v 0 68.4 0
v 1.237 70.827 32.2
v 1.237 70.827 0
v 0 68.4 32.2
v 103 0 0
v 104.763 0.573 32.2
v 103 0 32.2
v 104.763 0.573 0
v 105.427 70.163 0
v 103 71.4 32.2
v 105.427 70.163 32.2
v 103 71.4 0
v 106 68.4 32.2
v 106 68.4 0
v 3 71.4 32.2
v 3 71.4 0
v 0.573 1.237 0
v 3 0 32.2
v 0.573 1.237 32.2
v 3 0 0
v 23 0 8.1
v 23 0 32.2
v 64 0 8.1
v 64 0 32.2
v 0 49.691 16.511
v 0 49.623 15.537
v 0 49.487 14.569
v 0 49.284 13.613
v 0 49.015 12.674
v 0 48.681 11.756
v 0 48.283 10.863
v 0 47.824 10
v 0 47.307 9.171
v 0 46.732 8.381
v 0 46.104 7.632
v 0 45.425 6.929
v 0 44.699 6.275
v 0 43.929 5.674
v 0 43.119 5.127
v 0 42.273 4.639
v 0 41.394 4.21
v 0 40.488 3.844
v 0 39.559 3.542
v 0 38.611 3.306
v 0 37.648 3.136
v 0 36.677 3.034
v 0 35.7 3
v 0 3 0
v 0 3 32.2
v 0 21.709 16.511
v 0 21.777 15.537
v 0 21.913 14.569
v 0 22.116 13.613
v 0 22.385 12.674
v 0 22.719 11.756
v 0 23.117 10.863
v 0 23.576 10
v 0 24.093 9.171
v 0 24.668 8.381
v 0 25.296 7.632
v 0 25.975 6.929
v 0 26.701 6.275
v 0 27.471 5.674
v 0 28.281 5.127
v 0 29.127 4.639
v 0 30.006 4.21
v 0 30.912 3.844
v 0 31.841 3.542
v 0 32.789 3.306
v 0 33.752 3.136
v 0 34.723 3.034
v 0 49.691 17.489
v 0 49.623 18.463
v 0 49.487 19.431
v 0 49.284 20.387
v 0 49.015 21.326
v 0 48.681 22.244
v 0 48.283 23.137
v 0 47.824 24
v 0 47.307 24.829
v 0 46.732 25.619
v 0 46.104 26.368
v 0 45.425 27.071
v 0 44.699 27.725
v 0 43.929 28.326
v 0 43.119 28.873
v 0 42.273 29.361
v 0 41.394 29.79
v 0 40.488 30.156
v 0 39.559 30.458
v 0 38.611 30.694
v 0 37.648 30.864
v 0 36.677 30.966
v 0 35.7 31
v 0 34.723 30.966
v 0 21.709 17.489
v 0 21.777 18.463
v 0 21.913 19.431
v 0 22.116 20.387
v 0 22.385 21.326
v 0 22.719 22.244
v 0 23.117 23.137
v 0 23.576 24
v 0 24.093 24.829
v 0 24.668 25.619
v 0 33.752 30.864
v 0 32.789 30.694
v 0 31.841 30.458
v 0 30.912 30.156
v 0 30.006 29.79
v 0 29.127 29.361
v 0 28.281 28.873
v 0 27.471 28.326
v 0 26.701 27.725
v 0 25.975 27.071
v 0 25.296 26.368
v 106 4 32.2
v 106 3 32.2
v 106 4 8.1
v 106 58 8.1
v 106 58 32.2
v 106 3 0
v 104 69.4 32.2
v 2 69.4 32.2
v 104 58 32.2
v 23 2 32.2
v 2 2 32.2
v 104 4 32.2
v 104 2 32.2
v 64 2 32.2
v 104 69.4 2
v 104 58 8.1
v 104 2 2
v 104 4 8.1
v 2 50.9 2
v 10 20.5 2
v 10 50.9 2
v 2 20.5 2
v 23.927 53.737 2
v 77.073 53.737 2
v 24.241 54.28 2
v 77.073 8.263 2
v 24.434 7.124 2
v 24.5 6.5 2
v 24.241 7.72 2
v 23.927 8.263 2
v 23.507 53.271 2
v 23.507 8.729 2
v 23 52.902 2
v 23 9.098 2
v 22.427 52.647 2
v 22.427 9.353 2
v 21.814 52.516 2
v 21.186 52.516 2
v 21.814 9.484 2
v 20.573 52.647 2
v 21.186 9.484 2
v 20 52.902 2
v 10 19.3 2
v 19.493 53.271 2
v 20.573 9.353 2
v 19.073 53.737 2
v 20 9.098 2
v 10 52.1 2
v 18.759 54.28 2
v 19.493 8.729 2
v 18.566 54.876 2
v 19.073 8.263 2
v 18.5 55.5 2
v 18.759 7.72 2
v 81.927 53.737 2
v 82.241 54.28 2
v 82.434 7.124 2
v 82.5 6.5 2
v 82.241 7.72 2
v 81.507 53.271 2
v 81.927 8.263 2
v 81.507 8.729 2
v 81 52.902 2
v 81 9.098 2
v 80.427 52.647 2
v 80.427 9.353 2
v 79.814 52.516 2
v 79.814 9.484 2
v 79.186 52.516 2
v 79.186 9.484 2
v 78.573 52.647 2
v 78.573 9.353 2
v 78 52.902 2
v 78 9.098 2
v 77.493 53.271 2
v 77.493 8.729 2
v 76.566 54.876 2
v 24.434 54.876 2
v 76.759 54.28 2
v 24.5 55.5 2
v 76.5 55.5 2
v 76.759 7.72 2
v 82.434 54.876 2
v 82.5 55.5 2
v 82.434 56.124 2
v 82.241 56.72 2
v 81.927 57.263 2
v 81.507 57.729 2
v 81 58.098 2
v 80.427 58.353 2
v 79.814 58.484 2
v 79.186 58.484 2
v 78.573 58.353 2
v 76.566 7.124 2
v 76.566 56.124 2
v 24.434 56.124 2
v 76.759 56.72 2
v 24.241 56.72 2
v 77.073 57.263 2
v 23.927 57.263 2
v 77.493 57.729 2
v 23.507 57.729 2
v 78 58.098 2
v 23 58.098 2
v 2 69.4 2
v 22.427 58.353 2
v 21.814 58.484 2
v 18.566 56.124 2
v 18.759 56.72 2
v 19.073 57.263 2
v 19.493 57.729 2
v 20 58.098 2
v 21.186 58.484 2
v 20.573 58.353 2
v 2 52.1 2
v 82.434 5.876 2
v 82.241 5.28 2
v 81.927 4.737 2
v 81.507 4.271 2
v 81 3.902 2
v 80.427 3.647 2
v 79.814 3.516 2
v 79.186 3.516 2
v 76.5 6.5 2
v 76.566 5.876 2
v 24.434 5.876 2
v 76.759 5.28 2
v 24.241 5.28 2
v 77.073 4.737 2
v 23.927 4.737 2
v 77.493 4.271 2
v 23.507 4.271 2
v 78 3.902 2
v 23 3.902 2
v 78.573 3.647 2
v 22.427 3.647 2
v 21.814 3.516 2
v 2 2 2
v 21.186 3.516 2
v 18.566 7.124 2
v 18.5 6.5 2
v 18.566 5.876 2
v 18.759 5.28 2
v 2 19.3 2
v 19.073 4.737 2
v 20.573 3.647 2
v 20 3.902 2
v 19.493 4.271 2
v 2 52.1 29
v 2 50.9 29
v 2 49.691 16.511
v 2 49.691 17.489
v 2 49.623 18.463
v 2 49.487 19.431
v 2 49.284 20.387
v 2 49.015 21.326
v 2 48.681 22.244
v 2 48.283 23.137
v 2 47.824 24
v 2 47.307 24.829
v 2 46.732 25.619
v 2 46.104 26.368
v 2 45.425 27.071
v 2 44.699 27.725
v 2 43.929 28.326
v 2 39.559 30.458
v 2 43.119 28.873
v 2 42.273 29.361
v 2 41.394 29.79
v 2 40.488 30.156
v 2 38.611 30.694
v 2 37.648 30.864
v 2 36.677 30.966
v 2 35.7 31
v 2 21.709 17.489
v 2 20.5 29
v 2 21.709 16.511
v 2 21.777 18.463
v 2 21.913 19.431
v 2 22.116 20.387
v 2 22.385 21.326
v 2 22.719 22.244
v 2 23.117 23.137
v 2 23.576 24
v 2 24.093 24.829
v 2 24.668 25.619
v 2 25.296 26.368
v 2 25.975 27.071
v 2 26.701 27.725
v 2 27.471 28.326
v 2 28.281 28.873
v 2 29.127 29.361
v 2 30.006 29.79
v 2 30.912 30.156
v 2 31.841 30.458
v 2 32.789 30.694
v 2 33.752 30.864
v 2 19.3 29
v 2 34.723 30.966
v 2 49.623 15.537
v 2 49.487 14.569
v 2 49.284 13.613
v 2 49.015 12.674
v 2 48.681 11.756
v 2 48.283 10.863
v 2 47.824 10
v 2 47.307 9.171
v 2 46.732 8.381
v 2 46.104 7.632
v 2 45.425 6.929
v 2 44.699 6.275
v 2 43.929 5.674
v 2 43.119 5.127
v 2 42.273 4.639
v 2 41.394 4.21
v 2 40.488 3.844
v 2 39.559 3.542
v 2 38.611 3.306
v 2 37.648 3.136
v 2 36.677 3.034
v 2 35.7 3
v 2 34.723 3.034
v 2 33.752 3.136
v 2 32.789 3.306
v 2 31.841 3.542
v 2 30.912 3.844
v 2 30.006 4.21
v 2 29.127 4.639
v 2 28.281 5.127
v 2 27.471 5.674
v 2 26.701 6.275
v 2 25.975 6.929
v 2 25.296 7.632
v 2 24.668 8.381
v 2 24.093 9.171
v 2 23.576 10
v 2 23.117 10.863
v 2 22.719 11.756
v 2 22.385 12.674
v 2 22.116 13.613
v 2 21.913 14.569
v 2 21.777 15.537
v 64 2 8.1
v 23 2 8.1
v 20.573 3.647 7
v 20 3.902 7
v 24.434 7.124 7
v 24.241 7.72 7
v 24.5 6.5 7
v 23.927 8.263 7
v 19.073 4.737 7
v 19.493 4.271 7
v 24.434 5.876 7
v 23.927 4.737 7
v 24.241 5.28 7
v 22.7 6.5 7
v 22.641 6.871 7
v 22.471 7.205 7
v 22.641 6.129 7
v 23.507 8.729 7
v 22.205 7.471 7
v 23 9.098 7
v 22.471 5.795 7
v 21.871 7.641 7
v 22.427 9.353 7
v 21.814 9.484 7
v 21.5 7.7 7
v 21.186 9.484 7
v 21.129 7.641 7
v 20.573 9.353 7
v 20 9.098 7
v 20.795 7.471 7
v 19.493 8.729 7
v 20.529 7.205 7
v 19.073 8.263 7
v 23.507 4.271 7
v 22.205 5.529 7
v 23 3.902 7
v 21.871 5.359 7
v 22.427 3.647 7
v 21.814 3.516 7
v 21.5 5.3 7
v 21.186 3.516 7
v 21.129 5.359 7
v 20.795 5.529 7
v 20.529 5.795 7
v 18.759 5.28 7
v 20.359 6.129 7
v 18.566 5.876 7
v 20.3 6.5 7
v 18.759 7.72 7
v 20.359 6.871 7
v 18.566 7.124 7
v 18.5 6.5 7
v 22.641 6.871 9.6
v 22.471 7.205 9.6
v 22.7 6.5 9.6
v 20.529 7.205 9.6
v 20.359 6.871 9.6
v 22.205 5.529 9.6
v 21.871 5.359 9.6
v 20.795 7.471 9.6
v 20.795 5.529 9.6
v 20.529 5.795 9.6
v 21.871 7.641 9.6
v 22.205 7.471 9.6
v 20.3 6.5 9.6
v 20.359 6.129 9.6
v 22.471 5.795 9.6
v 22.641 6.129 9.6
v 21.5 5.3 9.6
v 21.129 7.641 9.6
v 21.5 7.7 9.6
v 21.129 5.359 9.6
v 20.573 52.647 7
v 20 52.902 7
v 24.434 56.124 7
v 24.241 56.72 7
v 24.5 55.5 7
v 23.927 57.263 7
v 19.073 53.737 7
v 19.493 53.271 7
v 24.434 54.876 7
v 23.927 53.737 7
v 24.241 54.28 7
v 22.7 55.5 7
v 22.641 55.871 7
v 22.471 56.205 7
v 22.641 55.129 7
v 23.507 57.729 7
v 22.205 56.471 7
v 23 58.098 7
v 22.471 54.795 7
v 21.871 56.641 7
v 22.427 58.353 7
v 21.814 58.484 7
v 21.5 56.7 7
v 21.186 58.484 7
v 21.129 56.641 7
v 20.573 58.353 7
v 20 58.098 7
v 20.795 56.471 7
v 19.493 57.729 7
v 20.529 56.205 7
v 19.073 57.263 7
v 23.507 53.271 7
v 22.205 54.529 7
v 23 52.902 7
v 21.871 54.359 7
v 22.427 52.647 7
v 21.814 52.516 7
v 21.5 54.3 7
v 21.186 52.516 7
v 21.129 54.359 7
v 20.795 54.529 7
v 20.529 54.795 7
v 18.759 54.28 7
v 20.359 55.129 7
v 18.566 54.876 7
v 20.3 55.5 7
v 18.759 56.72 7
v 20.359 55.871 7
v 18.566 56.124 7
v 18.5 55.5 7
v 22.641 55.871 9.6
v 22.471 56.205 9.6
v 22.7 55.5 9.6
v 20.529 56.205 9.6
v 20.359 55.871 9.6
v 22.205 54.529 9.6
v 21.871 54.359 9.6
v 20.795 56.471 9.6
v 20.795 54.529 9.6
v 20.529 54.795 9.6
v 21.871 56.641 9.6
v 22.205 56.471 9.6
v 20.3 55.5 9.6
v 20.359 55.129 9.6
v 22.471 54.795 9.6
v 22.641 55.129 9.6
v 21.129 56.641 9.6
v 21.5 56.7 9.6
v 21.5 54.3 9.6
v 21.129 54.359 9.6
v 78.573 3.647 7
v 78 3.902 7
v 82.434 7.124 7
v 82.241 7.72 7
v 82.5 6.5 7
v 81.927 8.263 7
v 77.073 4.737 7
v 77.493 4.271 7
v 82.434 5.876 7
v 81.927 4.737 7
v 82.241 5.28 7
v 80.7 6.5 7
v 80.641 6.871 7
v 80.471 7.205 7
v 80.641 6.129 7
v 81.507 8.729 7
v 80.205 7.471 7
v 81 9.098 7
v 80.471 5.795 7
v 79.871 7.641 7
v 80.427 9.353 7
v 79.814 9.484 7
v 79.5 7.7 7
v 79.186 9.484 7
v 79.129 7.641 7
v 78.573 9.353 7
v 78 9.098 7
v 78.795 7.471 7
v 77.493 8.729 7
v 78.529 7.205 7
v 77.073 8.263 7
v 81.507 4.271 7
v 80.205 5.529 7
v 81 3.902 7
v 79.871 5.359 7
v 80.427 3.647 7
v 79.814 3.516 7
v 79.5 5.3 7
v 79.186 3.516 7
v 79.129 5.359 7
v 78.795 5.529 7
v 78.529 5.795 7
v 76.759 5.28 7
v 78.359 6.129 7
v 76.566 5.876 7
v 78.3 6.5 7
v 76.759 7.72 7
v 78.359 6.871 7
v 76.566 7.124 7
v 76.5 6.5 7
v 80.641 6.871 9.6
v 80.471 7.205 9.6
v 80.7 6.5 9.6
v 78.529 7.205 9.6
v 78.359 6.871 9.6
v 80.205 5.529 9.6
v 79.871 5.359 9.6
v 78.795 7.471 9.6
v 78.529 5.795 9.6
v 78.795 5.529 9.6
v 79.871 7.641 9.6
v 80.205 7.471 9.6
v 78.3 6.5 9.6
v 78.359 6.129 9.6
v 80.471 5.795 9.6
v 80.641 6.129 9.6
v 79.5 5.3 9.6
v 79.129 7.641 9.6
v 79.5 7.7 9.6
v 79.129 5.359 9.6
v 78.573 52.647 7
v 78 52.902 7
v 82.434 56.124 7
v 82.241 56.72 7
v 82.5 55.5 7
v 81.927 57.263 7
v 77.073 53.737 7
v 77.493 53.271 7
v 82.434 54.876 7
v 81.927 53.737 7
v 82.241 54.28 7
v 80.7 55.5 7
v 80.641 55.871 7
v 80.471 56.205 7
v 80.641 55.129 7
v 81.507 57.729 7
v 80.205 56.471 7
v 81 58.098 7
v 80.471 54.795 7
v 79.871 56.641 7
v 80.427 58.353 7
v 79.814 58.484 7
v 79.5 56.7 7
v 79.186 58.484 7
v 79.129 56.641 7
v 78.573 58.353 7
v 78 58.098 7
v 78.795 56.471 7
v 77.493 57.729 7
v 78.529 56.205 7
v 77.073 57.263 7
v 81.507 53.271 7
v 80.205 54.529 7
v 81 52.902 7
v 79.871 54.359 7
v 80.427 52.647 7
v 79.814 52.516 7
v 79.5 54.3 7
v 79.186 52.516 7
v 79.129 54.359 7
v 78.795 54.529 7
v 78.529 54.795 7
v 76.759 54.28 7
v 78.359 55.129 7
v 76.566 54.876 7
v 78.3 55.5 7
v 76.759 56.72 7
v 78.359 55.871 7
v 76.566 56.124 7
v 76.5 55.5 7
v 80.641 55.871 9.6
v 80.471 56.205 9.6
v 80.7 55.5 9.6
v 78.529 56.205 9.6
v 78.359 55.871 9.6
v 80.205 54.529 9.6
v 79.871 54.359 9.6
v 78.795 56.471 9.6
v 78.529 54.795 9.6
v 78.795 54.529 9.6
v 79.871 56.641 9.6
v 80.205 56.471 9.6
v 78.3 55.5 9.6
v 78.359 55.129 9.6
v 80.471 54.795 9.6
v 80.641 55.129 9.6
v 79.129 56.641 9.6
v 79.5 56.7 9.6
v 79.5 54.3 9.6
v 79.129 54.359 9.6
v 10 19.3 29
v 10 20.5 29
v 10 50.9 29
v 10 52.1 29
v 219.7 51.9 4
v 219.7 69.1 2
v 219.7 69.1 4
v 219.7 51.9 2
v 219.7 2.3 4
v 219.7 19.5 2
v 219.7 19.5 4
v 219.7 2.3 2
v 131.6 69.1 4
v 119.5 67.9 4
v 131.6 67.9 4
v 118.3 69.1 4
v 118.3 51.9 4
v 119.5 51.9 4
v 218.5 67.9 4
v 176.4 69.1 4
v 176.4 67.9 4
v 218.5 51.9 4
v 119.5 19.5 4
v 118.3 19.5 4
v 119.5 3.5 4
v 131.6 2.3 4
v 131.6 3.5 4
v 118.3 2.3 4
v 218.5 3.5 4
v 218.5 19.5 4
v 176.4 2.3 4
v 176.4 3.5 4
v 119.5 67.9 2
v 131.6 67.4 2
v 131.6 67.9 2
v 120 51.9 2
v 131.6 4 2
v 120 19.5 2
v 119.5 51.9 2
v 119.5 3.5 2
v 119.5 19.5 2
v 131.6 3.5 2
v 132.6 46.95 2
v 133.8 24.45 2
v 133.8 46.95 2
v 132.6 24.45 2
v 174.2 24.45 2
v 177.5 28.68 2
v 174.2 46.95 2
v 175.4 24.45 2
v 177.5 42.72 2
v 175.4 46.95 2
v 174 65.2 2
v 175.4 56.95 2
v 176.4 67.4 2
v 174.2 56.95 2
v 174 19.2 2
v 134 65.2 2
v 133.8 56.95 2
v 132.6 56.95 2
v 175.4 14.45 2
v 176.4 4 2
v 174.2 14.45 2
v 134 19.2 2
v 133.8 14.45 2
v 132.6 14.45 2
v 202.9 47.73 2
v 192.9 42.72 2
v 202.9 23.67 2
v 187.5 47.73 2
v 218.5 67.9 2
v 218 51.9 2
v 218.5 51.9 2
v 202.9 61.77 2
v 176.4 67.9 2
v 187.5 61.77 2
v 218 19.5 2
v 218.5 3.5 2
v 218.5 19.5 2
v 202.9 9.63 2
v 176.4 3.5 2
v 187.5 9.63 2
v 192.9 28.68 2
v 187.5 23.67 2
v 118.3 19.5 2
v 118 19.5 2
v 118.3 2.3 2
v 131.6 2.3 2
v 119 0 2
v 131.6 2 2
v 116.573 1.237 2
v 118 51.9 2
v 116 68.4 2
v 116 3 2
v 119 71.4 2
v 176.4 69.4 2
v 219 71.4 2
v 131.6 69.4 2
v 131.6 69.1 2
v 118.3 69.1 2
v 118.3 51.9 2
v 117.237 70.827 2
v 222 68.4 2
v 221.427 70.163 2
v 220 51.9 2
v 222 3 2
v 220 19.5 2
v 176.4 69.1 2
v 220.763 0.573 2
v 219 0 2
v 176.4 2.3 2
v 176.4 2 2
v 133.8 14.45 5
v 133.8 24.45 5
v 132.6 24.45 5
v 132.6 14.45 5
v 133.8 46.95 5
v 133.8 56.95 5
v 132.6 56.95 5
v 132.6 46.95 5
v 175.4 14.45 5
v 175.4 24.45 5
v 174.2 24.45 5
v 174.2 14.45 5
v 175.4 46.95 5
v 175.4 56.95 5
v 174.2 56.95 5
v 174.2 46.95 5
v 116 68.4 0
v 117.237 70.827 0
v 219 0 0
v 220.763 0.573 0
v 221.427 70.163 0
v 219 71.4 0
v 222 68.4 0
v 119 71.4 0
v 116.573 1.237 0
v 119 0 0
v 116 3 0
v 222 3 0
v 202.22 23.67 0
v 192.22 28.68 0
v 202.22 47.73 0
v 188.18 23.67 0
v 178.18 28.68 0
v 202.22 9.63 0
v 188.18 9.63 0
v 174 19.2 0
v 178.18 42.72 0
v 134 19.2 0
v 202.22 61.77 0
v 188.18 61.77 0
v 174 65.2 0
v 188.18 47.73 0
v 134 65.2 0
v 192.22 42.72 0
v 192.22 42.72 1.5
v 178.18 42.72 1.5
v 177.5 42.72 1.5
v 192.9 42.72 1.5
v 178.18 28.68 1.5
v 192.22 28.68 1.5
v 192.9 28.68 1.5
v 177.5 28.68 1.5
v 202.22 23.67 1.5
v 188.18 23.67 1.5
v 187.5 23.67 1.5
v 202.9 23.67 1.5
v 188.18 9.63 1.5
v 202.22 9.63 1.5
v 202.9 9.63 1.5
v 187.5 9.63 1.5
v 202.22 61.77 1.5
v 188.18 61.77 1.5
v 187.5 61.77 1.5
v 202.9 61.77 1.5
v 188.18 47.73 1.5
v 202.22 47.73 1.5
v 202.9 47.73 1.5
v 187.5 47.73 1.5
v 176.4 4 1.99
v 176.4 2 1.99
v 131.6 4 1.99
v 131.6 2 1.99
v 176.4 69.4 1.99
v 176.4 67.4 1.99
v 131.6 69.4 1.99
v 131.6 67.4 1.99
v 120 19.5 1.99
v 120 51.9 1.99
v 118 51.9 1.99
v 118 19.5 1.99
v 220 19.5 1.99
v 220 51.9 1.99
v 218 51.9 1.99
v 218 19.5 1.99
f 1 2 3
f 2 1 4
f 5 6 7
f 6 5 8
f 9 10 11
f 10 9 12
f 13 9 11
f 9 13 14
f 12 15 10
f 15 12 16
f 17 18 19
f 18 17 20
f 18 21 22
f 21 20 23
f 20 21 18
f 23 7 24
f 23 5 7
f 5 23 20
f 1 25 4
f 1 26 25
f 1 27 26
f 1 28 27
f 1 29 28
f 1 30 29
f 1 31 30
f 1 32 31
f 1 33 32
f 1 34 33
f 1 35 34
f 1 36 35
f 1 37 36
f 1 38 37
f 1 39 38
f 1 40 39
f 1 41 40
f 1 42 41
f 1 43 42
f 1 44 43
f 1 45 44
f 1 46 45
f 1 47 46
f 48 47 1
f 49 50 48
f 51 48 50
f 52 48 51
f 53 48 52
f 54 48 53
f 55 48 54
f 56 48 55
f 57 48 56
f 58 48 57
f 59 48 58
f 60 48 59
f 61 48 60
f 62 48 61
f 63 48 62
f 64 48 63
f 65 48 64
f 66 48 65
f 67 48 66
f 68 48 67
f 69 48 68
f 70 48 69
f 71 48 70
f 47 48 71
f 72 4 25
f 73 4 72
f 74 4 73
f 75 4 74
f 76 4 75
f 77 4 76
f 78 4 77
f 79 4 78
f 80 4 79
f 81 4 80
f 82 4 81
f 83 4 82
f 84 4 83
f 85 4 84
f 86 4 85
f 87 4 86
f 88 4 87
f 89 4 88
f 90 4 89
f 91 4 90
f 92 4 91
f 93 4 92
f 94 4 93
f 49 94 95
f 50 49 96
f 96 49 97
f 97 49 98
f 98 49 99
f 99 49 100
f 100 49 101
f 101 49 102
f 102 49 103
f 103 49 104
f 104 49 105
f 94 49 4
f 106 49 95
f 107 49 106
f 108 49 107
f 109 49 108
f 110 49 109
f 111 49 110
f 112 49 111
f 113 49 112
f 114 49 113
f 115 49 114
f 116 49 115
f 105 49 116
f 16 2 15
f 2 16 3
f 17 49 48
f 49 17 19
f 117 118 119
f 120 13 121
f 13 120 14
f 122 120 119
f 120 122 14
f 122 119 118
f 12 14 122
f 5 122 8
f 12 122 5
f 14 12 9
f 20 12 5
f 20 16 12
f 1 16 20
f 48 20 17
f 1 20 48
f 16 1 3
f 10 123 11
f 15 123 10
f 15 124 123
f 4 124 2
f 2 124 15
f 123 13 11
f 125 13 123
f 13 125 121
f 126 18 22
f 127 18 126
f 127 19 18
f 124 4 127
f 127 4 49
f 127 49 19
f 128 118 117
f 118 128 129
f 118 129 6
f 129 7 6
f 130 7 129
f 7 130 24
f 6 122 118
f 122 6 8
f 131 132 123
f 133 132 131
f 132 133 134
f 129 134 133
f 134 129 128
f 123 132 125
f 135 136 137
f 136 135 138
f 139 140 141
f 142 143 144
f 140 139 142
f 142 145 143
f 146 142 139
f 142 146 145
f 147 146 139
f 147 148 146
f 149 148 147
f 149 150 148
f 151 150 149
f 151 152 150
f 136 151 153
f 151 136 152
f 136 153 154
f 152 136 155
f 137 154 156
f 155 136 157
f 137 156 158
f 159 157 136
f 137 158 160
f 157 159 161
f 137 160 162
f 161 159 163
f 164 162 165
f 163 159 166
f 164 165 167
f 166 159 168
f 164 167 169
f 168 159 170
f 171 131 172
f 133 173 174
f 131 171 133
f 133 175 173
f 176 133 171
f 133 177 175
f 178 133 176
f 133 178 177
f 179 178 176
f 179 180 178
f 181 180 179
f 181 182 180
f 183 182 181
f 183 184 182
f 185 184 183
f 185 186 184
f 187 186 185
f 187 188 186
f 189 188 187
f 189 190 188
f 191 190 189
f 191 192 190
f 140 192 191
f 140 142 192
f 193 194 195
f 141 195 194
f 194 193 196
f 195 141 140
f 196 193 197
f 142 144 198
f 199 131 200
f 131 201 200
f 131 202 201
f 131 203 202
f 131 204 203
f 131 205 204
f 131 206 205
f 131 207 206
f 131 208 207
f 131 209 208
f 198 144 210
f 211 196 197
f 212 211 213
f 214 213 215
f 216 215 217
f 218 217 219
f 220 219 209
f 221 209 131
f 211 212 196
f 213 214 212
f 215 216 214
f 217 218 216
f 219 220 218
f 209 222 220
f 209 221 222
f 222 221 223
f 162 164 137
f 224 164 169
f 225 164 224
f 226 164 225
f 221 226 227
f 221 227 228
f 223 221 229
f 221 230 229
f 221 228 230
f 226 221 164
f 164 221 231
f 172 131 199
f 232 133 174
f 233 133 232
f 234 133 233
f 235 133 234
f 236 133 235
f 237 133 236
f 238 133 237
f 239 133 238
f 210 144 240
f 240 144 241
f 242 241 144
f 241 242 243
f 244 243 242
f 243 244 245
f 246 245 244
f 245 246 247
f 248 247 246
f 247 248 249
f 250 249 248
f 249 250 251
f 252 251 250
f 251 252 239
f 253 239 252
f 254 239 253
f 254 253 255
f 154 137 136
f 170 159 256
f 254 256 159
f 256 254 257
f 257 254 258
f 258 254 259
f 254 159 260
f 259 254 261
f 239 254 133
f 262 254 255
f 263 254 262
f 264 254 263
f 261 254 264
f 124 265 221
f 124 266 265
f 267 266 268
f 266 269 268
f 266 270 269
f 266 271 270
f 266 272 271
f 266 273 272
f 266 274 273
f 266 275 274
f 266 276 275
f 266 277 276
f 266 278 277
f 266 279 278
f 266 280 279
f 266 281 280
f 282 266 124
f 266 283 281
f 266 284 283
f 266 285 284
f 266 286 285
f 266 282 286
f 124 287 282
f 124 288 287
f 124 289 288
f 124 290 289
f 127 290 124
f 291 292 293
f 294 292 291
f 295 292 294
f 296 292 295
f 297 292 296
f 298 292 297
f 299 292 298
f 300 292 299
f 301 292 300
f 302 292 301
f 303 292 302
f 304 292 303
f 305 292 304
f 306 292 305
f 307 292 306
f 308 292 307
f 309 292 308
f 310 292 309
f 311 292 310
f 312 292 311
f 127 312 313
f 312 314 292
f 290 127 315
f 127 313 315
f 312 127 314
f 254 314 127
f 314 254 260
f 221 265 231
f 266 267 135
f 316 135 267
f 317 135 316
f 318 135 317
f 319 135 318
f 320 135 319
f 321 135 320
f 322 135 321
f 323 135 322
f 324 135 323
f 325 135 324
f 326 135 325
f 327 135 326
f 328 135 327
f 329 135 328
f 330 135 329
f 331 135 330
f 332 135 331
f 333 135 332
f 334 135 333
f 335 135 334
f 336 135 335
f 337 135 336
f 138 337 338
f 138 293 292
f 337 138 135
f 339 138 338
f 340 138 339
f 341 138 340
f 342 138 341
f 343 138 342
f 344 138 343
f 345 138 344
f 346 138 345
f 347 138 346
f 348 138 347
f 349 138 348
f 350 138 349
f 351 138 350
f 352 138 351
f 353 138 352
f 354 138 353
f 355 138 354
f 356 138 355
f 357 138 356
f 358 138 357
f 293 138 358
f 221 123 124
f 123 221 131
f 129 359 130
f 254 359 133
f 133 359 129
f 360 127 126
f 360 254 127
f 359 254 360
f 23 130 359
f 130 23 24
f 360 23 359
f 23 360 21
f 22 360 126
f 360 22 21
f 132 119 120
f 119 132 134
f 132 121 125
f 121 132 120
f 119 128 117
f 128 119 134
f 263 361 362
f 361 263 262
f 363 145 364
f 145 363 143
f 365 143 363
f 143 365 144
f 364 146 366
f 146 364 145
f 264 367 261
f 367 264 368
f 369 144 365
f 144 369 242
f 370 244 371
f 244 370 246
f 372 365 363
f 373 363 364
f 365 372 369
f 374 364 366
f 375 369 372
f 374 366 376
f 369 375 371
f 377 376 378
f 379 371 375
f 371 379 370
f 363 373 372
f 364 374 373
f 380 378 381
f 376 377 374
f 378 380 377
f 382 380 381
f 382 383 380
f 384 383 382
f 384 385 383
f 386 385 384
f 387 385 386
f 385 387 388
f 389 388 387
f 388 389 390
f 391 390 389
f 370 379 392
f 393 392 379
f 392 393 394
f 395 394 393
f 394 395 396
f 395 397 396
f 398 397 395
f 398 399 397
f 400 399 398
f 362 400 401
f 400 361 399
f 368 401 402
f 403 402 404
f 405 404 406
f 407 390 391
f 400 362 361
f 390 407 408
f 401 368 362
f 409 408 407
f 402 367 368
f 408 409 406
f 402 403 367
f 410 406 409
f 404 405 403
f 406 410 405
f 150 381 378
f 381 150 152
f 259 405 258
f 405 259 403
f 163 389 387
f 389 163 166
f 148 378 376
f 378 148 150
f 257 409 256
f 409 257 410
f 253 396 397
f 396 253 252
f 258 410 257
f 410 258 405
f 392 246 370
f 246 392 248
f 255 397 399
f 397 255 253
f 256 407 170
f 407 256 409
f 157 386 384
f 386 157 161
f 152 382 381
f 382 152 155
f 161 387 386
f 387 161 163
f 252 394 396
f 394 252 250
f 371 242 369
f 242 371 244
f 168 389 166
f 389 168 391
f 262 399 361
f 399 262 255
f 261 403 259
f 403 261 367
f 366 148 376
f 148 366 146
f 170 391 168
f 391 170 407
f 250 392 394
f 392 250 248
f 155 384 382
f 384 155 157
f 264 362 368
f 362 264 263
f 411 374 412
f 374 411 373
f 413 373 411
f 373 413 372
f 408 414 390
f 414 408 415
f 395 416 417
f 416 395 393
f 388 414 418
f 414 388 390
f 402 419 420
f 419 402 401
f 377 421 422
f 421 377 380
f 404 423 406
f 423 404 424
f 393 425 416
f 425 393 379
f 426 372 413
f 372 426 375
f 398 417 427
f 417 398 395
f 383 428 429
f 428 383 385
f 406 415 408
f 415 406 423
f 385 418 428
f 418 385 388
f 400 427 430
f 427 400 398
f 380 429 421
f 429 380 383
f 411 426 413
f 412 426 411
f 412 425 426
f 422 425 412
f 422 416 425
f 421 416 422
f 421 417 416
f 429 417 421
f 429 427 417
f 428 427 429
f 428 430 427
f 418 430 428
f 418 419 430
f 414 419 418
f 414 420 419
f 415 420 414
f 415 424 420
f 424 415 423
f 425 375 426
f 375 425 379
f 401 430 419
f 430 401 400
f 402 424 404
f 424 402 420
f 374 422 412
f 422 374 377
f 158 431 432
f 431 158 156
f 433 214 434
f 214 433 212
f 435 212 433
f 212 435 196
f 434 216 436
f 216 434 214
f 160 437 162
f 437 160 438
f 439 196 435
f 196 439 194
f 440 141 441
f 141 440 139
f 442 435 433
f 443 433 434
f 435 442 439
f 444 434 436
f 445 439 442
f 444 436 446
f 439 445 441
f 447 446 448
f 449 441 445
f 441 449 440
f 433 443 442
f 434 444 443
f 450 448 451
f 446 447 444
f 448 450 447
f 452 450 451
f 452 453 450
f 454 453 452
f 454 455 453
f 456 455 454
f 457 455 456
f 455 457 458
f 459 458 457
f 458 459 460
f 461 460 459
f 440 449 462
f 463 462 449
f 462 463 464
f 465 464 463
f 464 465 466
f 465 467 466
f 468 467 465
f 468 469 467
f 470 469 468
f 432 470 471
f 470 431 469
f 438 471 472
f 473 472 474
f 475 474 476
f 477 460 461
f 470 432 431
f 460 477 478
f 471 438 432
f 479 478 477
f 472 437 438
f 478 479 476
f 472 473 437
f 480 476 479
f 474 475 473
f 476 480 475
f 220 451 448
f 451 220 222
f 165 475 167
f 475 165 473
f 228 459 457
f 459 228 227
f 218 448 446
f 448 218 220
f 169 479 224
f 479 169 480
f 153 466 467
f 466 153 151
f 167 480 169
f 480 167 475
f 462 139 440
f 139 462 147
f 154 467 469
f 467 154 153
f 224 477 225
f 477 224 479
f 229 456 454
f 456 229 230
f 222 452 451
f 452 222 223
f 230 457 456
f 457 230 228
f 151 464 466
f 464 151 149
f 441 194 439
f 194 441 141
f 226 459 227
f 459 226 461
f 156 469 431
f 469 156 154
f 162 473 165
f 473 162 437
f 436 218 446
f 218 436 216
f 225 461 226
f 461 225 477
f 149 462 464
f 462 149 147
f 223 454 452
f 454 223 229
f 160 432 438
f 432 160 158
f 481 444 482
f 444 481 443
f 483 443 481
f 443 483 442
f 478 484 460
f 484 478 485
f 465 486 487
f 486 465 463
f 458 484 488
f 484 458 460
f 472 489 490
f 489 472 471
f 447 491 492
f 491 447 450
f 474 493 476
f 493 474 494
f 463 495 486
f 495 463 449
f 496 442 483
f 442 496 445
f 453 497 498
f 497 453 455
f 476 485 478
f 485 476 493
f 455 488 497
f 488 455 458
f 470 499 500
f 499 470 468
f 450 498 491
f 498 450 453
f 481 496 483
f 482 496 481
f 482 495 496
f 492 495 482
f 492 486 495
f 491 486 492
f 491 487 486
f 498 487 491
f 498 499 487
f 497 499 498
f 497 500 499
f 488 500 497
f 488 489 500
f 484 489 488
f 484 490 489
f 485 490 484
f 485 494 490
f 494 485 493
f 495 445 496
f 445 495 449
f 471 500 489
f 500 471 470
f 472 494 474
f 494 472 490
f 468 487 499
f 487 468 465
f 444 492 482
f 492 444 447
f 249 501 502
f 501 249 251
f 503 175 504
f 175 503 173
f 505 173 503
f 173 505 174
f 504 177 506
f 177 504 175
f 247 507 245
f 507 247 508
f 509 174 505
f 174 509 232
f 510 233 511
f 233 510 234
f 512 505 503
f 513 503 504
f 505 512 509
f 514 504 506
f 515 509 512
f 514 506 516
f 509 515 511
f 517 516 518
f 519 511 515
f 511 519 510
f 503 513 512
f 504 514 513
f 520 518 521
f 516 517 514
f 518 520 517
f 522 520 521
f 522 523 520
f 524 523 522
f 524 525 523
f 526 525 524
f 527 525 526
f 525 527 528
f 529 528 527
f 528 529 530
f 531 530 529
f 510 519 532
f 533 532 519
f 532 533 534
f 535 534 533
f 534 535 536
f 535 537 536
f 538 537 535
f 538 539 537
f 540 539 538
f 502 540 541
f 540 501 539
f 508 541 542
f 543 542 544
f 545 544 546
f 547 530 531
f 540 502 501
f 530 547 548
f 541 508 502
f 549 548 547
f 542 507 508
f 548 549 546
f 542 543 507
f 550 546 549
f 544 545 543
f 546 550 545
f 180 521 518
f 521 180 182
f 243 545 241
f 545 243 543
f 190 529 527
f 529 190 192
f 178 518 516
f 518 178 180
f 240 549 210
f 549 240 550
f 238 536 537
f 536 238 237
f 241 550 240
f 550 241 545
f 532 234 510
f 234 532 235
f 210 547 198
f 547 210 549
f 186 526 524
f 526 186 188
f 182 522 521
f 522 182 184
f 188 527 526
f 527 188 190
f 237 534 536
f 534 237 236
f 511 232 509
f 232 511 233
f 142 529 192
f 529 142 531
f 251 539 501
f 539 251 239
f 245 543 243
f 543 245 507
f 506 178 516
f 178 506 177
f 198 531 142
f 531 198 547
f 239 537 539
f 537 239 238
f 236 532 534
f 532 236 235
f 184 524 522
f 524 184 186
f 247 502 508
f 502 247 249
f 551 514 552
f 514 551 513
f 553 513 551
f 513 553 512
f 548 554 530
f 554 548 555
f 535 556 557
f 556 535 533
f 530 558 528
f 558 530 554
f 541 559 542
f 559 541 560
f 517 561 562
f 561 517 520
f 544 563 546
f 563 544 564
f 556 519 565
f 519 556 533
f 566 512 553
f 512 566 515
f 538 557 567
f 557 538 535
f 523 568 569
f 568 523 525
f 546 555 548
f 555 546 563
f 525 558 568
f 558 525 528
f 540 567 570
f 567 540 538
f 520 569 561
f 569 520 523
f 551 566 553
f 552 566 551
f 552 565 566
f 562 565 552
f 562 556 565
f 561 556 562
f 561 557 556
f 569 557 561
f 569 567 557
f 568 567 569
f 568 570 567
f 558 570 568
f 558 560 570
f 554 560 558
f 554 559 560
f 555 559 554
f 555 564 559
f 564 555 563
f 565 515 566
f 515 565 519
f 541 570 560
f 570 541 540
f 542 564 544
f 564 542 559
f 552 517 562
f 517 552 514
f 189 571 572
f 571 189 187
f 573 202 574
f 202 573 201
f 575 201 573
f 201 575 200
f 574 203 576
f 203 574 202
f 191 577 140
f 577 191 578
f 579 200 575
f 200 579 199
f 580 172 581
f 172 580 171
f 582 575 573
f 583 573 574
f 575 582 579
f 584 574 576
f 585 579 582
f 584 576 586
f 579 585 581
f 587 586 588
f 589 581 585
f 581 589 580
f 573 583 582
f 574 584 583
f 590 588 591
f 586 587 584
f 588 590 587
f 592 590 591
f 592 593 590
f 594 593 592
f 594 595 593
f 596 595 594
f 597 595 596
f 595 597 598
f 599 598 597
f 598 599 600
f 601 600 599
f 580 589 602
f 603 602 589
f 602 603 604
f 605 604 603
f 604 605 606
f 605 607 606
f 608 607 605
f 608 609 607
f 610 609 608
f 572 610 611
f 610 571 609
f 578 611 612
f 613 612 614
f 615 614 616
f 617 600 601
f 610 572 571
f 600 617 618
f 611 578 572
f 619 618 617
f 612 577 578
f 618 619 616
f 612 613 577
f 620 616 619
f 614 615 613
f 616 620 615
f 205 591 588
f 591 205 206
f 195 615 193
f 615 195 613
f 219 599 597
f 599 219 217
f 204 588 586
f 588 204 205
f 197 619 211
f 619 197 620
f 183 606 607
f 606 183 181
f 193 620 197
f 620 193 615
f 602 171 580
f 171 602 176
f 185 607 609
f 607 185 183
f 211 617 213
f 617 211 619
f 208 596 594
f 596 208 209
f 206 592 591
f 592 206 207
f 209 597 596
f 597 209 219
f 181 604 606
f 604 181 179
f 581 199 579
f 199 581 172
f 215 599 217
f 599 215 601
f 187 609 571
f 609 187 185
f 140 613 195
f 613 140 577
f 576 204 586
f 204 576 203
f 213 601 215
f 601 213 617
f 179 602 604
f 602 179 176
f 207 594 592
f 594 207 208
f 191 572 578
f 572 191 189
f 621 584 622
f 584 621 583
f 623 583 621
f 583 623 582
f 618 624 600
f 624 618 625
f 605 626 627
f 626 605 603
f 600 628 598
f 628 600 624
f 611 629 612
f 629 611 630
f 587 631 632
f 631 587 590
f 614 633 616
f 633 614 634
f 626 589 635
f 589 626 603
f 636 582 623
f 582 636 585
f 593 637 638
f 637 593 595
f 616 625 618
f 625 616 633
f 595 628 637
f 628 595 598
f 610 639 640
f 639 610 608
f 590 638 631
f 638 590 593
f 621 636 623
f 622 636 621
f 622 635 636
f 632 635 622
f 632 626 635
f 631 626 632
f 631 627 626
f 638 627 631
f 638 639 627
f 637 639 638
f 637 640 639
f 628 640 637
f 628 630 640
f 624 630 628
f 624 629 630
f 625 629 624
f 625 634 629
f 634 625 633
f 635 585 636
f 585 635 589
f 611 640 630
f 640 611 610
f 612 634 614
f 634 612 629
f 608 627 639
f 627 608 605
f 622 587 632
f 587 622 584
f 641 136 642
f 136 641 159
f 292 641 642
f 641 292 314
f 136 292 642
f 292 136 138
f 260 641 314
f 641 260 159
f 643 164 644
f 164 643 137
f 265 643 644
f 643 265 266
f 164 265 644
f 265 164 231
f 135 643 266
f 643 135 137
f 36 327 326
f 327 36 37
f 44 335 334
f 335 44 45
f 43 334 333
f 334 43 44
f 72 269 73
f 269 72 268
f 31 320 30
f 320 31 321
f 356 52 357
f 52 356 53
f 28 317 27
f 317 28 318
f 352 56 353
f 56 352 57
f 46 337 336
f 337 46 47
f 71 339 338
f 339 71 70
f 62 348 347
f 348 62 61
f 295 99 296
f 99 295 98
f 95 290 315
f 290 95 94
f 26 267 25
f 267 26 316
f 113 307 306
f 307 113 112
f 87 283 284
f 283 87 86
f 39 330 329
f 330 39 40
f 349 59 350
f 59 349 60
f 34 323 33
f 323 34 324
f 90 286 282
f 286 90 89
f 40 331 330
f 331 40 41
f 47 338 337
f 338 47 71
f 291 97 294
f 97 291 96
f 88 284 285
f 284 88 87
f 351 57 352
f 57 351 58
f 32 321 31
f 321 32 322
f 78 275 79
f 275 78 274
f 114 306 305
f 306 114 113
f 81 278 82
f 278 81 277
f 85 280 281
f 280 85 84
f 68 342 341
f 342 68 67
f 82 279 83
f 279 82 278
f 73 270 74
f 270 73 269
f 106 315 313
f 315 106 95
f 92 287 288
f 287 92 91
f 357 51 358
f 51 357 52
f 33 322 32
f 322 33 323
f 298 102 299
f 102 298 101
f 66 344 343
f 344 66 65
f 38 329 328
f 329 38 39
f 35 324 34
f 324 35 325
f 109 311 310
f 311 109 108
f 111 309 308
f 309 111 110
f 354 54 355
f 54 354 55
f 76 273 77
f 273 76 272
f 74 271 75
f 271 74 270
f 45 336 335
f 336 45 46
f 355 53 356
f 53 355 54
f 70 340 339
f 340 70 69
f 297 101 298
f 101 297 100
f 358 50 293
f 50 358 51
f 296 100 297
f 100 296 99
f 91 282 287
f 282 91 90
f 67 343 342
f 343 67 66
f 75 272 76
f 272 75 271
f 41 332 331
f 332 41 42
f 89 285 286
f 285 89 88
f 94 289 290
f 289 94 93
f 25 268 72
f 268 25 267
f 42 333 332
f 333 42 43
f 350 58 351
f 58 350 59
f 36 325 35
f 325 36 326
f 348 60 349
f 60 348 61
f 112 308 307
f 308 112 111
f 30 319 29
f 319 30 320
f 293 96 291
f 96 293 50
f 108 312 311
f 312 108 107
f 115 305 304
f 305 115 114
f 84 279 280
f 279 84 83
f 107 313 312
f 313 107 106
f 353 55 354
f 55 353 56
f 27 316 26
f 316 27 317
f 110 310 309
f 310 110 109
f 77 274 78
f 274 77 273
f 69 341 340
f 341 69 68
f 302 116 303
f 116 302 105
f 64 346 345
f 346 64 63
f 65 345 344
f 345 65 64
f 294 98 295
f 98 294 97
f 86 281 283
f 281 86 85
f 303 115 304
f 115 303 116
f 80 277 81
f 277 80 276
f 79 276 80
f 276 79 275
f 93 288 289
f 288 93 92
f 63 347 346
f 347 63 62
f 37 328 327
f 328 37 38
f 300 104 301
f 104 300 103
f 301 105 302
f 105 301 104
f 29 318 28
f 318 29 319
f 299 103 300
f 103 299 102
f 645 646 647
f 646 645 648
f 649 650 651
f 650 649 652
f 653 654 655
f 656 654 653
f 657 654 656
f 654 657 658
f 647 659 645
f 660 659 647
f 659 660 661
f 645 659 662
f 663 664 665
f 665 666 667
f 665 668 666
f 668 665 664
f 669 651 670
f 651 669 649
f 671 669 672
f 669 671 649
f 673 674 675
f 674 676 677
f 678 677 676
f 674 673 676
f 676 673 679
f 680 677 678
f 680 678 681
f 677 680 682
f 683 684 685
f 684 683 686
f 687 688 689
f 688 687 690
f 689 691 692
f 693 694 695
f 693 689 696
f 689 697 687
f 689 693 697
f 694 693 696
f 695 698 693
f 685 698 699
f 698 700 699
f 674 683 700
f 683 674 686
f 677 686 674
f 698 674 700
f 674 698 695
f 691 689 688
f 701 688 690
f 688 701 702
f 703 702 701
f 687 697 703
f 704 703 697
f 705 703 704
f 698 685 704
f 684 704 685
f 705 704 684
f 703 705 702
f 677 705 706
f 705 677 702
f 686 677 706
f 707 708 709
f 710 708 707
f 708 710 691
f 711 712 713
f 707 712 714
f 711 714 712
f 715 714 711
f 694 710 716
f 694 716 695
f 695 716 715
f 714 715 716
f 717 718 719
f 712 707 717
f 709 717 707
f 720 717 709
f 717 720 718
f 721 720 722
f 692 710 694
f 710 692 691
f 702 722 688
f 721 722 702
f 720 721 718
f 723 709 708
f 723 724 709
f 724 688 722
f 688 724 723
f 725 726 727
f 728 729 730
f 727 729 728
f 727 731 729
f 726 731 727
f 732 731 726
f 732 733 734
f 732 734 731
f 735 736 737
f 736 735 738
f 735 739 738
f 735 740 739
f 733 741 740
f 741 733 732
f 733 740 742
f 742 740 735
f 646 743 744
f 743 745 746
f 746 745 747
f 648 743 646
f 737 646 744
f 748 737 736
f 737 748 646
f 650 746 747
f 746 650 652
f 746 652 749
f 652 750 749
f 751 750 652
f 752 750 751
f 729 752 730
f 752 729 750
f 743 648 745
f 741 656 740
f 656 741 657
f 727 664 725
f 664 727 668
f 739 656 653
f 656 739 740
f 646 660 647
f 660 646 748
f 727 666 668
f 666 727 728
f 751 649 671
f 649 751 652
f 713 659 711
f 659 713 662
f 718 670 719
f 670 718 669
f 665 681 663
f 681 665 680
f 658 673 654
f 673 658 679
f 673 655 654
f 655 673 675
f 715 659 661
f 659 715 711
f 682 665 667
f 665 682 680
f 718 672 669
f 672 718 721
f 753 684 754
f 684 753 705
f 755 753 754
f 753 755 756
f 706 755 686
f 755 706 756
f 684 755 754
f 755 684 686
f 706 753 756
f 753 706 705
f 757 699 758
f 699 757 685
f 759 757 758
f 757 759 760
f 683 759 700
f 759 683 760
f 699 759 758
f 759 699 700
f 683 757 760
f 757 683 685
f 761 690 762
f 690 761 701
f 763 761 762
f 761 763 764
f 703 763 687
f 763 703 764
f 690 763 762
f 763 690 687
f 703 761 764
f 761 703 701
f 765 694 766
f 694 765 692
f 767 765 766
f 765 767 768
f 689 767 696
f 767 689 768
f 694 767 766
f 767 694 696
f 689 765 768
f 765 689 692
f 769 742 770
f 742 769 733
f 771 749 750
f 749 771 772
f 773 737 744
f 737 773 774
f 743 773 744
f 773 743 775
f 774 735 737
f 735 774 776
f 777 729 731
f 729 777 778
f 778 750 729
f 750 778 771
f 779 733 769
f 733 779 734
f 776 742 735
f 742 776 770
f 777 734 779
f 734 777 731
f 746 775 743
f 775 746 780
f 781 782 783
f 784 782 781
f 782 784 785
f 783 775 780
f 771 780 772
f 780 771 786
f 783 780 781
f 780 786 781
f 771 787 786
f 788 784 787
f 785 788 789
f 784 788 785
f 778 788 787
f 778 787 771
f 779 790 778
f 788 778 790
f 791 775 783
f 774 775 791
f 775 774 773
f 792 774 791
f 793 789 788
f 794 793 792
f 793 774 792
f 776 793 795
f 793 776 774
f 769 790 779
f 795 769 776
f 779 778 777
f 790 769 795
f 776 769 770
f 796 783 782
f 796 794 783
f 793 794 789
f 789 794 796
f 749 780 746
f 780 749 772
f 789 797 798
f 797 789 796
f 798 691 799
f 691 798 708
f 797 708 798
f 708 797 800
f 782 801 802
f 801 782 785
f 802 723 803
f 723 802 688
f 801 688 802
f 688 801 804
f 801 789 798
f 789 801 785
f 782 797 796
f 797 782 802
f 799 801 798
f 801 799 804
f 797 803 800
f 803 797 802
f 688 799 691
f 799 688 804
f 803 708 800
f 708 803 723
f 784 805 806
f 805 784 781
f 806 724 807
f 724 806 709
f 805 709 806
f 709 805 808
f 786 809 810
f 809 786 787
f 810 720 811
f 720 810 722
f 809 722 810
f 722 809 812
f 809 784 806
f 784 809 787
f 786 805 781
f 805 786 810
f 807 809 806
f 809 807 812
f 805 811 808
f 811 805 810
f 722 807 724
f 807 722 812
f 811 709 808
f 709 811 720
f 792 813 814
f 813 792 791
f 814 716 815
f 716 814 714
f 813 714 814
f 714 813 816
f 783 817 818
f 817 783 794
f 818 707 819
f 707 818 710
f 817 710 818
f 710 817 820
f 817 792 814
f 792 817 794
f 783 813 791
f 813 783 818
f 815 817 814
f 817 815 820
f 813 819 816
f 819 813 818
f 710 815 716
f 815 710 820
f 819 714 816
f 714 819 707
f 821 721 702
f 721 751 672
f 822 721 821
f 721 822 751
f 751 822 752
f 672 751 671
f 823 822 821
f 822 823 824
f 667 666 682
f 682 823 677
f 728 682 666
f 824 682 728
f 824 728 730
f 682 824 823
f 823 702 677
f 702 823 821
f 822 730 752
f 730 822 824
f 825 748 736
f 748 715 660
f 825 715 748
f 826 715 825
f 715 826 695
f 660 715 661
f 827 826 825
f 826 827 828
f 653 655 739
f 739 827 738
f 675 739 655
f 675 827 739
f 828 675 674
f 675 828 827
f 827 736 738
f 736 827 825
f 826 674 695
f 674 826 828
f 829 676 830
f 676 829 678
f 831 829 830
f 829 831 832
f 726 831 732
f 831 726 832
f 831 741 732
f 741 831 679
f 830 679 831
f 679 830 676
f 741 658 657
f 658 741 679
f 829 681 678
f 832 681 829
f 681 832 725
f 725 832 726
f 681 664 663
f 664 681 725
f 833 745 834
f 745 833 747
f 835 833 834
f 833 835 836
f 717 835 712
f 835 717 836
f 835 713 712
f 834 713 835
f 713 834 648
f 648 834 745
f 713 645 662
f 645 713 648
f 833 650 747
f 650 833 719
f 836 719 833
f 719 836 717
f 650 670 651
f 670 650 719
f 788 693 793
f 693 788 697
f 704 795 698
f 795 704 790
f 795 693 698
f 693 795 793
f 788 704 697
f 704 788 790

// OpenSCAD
// Raspberry Pi 5 case v3 (EXPERIMENT): screen rotated 90 deg, switches in a V, case widened.
//   Base : same as pi_case.scad, but the -x end-wall camera opening is enlarged into a
//          28 mm fan opening, and the 30x30x7 fan sits INSIDE the case against that wall
//          (nothing sticks out of the case), held by two side ribs on the floor.
//   Lid  : same as pi_case.scad (same screen window), short-side screen walls removed,
//          4 round buttons replaced by 3 Cherry MX cutouts.
// Export: openscad -D 'part="base"' -o base.stl pi_case_v3.scad   (same for "lid", "testbed")
// Print : base upright (floor on bed). Lid plate/face DOWN on bed, as in v1.
// Assemble: flip the lid END-OVER-END (about the Y axis) so the switch row lands on the
//           HDMI / USB-C (-y) side. Everything that mates is symmetric, so either flip fits.
// All units mm. Values marked (ASSUMED) were not specified - see the bottom of the file.

part = "both";      // "base", "lid", "testbed", "both" (print layout), "assembled" (preview), "none"

// ---------- Raspberry Pi 5 (unchanged from v1) ----------
pi_l = 85;  pi_w = 56;  pi_t = 1.6;
pi_hole_dx = 58;  pi_hole_dy = 49;  pi_hole_off = 3.5;   // M2.5 holes
usb_h = 17;         // USB/Ethernet stack height above the PCB (assumed in v1)

// ---------- case (unchanged from v1: proven tolerances) ----------
wall = 2;  floor_t = 2;  plate_t = 2;   // plate_t = lid top thickness
clr = 1;            // gap between Pi and inside wall
fit = 0.3;          // lid lip clearance
lip_t = 1.2;        // lip / pocket wall thickness
ring_h = 2;         // height of the lip that drops into the base
standoff_h = 5;
margin = lip_t + fit;

// ---------- screen (unchanged from v1) ----------
scr_l = 65;  scr_w = 40;   // PCB
scr_t = 5;                 // PCB + glass thickness (v1 assumption)
win_l = 46;  win_w = 40;   // visible window (kept exactly)
win_edge = 3;              // window offset from the glass-end PCB edge (kept exactly)
// Screen locators: small tabs on the two LONG sides only (the screen is taped in, so they
// just stop it sliding). v1 had full-length 5.6 mm walls; these are small and low.
tab_len = 10;              // along the screen's long edge
tab_h = 3;                 // hang below the plate (screen is 5 mm thick, so it still locates it)
tab_n = 2;                 // per long side, placed symmetrically about the board centre
tab_gap = 0.2;             // clearance to the board edge (same 0.4 total as v1's pocket)
tab_x = scr_l/4;           // tabs at +-this from the board centre along the long axis

// ---------- v3: screen rotated 90 deg, switches in a V ----------
scr_end_gap = 1.0;         // board end to base wall, each end (board now runs along y)
glass_end_y = 1;           // +1 = glass end (3 mm blank) toward +y, -1 = toward -y
vee_dx = 10;               // arm keys sit this much farther from the screen than the vertex key
vee_dy = 19.05;            // arm keys are this far above/below the vertex key (1u pitch)
vee_gap = 2;               // screen edge to vertex keycap edge

// ---------- camera (v1 geometry; kept so the base layout is identical) ----------
cam_l = 25;  cam_w = 24;
cam_hole_d = 14;    // v1 lens opening (replaced by the fan opening below)
cam_lens_dy = 2.5;
cam_depth = 8;
cam_wall = 1.2;
cam_cradle_on = false;     // v2: cradle removed - it would sit 8 mm behind the fan and block it

// ---------- fan (ASSUMED: 30 x 30 x 7 mm, e.g. 3007 5 V) ----------
fan_s = 30;                // frame size (height and width)
fan_t = 7;                 // frame thickness = depth into the case from the inner wall face
fan_hole_d = 28;           // airflow opening through the wall (blade sweep ~27-28); a 29 mm
                           // hole would leave only 0.7 mm of wall above it
fan_clr = 0.2;             // clearance per side between fan frame and the ribs
rib_t = 1.2;               // side rib thickness
rib_top = 29;              // ribs stop here (z), below the lid lip (z 30.2) so they never touch it
cable_z = rib_top;         // fan lead runs over the +y rib top, in the 3 mm under the lid

// ---------- switches (Cherry MX) ----------
mx_cut = 14.04;            // measured from modular-key-v1.stl (nominal 14.00), axis-aligned
mx_n = 3;
mx_pitch = 19.05;          // 1u keycap spacing
mx_plate_t = 1.5;          // plate thickness the MX clips need
mx_relief = 15.4;          // underside relief pocket along the clip axis (clip span ~15.2 mm)
mx_rot = 90;               // switch turned 90 deg: plate clips face +-x (along the row), so
                           // nothing sticks out toward the base wall or the screen in y.
                           // The 14 mm square cutout itself is the same either way.
mx_below = 8.3;            // housing (5.0) + pins (3.3) below the plate top face
mx_body = 14.0;            // housing width below the plate
keycap = 18;               // 1u keycap footprint (for the clearance report)
btn_row = 14;              // v1 strip below the screen that holds the switch row

// ---------- derived layout (identical to v1) ----------
pocket_l = scr_l + 0.4 + 2*lip_t;
pocket_w = scr_w + 0.4 + 2*lip_t;
cam_out_l = cam_l + 0.4 + 2*cam_wall;
cam_out_w = cam_w + 0.4 + 2*cam_wall;
cam_len   = cam_depth + 4;
bay_l = cam_len + 3;

px = bay_l + clr;
py = clr;
board_x = scr_w + 2*tab_gap;              // rotated board footprint, x
board_y = scr_l + 2*tab_gap;              //                          y (65.4 - longer than v1's W)
group_l = board_x + vee_gap + keycap + vee_dx;   // screen + V, one block, centred on the lid
L = max(px + pi_l + clr, 2*margin + group_l);                   // inner length
W = max(pi_w + 2*clr, board_y + 2*scr_end_gap);                 // inner width (v1 was 59.8)

win_sy = glass_end_y * (scr_l/2 - win_edge - win_l/2);   // window offset from board centre (y)
group_x0 = L/2 - group_l/2;               // left edge of the block, inner coords
scr_cx = group_x0 + board_x/2;
scr_cy = W/2;
// V: vertex key nearest the screen, two arm keys farther out and +-vee_dy up/down
mx_vx = group_x0 + board_x + vee_gap + keycap/2;
mx_pos = [[mx_vx, W/2], [mx_vx + vee_dx, W/2 - vee_dy], [mx_vx + vee_dx, W/2 + vee_dy]];

cam_cy = W/2;
cam_cz = floor_t + cam_out_w/2;

pcb_top = floor_t + standoff_h + pi_t;
hang   = max(ring_h, scr_t + 0.6);
base_h = pcb_top + usb_h + hang + 1;

Lo = L + 2*wall;  Wo = W + 2*wall;        // outer footprint (base and lid)

// ---------- derived v2 ----------
fan_cy = cam_cy;                          // centred on the end wall
fan_cz = floor_t + fan_s/2;               // fan sits on the floor: z 2..32 (lid plate is at 32.2)
board_notch = board_x + 2*(lip_t + 1);    // lid lip removed where the board's ends pass it (x length)

module rrect(l, w, r, h) {
  translate([r, r, 0]) linear_extrude(h) offset(r = r) square([l - 2*r, w - 2*r]);
}

// ======================= BASE =======================
module base() {
  difference() {
    union() {
      difference() {
        rrect(Lo, Wo, 3, base_h);
        // cavity
        translate([wall, wall, floor_t]) cube([L, W, base_h]);
        // -y wall: USB-C power + 2 micro-HDMI (Pi 5 has no audio jack)
        translate([wall + px + 5, -1, pcb_top - 0.5]) cube([41, wall + 2, base_h]);
        // +x wall: Ethernet + USB
        translate([wall + L - 1, wall + py + 1, pcb_top - 0.5]) cube([wall + 2, pi_w - 2, base_h]);
      }
      // Pi standoffs with locating pins
      for (x = [0, pi_hole_dx], y = [0, pi_hole_dy])
        translate([wall + px + pi_hole_off + x, wall + py + pi_hole_off + y, floor_t]) {
          cylinder(d = 6, h = standoff_h, $fn = 30);
          cylinder(d = 2.4, h = standoff_h + pi_t + 1, $fn = 20);
        }
      if (cam_cradle_on) cam_cradle();
      fan_ribs();
    }
    // -x wall: v1 camera opening enlarged into the fan opening
    fan_cutout();
  }
}

// Opening through the -x end wall. The fan's airflow face sits flush on its inner side.
module fan_cutout() {
  translate([-1, wall + fan_cy, fan_cz])
    rotate([0, 90, 0]) cylinder(d = fan_hole_d, h = wall + 1.01, $fn = 90);
}

// Two ribs on the floor, either side of the fan; the wall is the back stop, the lid is the
// top stop (0.2 mm), the fan drops in from above. Tape or a dab of glue stops it sliding
// forward. Ribs are open at the front, so the fan lead leaves over the +y rib top.
module fan_ribs() {
  for (s = [-1, 1])
    translate([wall - 0.01, wall + fan_cy + s*(fan_s/2 + fan_clr) - (s < 0 ? rib_t : 0), floor_t - 0.01])
      cube([fan_t + 1.01, rib_t, rib_top - floor_t + 0.01]);
}

// v1 camera cradle, kept for reference (off by default)
module cam_cradle() {
  difference() {
    translate([wall, wall + cam_cy - cam_out_l/2, floor_t - 0.1])
      cube([cam_len, cam_out_l, cam_out_w + 0.1]);
    translate([wall - 0.01, wall + cam_cy - (cam_l + 0.4)/2, floor_t + cam_wall])
      cube([cam_len + 1, cam_l + 0.4, cam_out_w]);
  }
  for (sy = [-1, 1], z = [0, cam_w + 0.4 - 4])
    translate([wall + cam_depth - 1.5,
               wall + cam_cy + sy * (cam_l + 0.4)/2 - (sy > 0 ? 4 : 0),
               floor_t + cam_wall + z])
      cube([1.5, 4, 4]);
}

// ======================= LID =======================
// Printed plate-down; it flips over onto the base.
module lid() {
  difference() {
    union() {
      rrect(Lo, Wo, 3, plate_t);
      // lip that drops into the base (notched over the switch row)
      translate([wall + fit, wall + fit, plate_t]) difference() {
        cube([L - 2*fit, W - 2*fit, ring_h]);
        translate([lip_t, lip_t, -1]) cube([L - 2*fit - 2*lip_t, W - 2*fit - 2*lip_t, ring_h + 2]);
      }
      // screen locator tabs: 2 small tabs on each LONG side of the (now rotated) board
      for (sx = [-1, 1], sy = [-1, 1])
        translate([wall + scr_cx + (sx > 0 ? scr_w/2 + tab_gap : -(scr_w/2 + tab_gap + lip_t)),
                   wall + scr_cy + sy*tab_x - tab_len/2,
                   plate_t - 0.01])
          cube([lip_t, tab_len, tab_h + 0.01]);
    }
    // screen window, rotated: 40 (x) by 46 (y), shifted toward the glass end of the board
    translate([wall + scr_cx - win_w/2, wall + scr_cy + win_sy - win_l/2, -1])
      cube([win_w, win_l, plate_t + 2]);
    // MX switches in a V
    for (p = mx_pos)
      translate([wall + p[0], wall + p[1], 0]) rotate([0, 0, mx_rot]) {
        translate([-mx_cut/2, -mx_cut/2, -1]) cube([mx_cut, mx_cut, plate_t + 2]);
        if (plate_t > mx_plate_t)   // underside relief on the clip faces -> 1.5 mm plate there
          translate([-mx_cut/2, -mx_relief/2, mx_plate_t]) cube([mx_cut, mx_relief, plate_t]);
      }
    // lip notches at both long edges where the board's ends pass (board is longer than the
    // lip's inner width), centred on the board so the lid stays mirror-symmetric in y
    for (ey = [wall, wall + W - fit - lip_t - 0.5])
      translate([wall + scr_cx - board_notch/2, ey, plate_t - 0.01])
        cube([board_notch, fit + lip_t + 0.5, ring_h + 1]);
    // lip notches at BOTH short ends over the fan (fan top is 0.2 mm under the plate, so the
    // lip would hit it); both ends so either lid flip works. Centred, so mirror-symmetric.
    for (ex = [wall, wall + L - fit - lip_t - 0.5])
      translate([ex, wall + W/2 - (fan_s/2 + fan_clr + 1), plate_t - 0.01])
        cube([fit + lip_t + 0.5, fan_s + 2*fan_clr + 2, ring_h + 1]);
  }
}

// lid in its closed position on the base (flipped end-over-end)
module lid_assembled() {
  translate([Lo, 0, base_h + plate_t]) rotate([0, 180, 0]) lid();
}

// Test bed: an exact full-depth slice of lid() around the screen and the 3 switches
// (same window, screen walls, MX cutouts + relief, plate thickness, lip segments).
// Being full depth, its lip pieces also drop into a base, so it can sit on the case.
tb_x0 = wall + group_x0 - 2;
tb_x1 = wall + group_x0 + group_l + 2;
module test_bed() {
  translate([-tb_x0, 0, 0]) intersection() {
    lid();
    translate([tb_x0, -1, -1]) cube([tb_x1 - tb_x0, Wo + 2, 50]);
  }
}

if (part == "base") base();
else if (part == "lid") lid();
else if (part == "testbed") test_bed();
else if (part == "assembled") { base(); lid_assembled(); }
else if (part == "both") {
  base();
  translate([Lo + 10, 0, 0]) lid();
}

echo(str("Outer size: ", Lo, " x ", Wo, " x ", base_h + plate_t, " mm (base + lid)"));
echo(str("Base h ", base_h, "  lid h ", plate_t + hang, "  inner ", L, " x ", W));
echo(str("Fan inside: x ", wall, "..", wall + fan_t, "  y ", wall + fan_cy - fan_s/2, "..", wall + fan_cy + fan_s/2, "  z ", fan_cz - fan_s/2, "..", fan_cz + fan_s/2, "  Pi starts x ", wall + px));
echo(str("MX centres (world): ", [for (p = mx_pos) [wall + p[0], wall + p[1]]]));
echo(str("Keycap extents x ", wall + mx_vx - keycap/2, "..", wall + mx_vx + vee_dx + keycap/2,
         "  y ", wall + W/2 - vee_dy - keycap/2, "..", wall + W/2 + vee_dy + keycap/2, "  arm-vertex gap in y ", vee_dy - keycap));
echo(str("Window x ", wall + scr_cx - win_w/2, "..", wall + scr_cx + win_w/2, "  y ", wall + scr_cy + win_sy - win_l/2, "..", wall + scr_cy + win_sy + win_l/2));
echo(str("Screen board x ", wall + scr_cx - board_x/2, "..", wall + scr_cx + board_x/2, "  y ", wall + scr_cy - board_y/2, "..", wall + scr_cy + board_y/2, "  group margin L/R ", wall + group_x0));

// ---------- ASSUMPTIONS (fields left TODO) ----------
// Fan: 30x30x7 mm, INSIDE the case on the floor against the -x wall, held by two ribs +
//   tape/glue. 28 mm wall opening. Its screw holes aren't used. Fan lead runs over a rib.
// Screen: v1 numbers kept (65x40 PCB, 46x40 window, 5 mm thick); glass size unknown.
// Switch layout: 3 in a row at 19.05 mm pitch in v1's button strip, centred on the lid.
// Print: base upright; lid face down.
